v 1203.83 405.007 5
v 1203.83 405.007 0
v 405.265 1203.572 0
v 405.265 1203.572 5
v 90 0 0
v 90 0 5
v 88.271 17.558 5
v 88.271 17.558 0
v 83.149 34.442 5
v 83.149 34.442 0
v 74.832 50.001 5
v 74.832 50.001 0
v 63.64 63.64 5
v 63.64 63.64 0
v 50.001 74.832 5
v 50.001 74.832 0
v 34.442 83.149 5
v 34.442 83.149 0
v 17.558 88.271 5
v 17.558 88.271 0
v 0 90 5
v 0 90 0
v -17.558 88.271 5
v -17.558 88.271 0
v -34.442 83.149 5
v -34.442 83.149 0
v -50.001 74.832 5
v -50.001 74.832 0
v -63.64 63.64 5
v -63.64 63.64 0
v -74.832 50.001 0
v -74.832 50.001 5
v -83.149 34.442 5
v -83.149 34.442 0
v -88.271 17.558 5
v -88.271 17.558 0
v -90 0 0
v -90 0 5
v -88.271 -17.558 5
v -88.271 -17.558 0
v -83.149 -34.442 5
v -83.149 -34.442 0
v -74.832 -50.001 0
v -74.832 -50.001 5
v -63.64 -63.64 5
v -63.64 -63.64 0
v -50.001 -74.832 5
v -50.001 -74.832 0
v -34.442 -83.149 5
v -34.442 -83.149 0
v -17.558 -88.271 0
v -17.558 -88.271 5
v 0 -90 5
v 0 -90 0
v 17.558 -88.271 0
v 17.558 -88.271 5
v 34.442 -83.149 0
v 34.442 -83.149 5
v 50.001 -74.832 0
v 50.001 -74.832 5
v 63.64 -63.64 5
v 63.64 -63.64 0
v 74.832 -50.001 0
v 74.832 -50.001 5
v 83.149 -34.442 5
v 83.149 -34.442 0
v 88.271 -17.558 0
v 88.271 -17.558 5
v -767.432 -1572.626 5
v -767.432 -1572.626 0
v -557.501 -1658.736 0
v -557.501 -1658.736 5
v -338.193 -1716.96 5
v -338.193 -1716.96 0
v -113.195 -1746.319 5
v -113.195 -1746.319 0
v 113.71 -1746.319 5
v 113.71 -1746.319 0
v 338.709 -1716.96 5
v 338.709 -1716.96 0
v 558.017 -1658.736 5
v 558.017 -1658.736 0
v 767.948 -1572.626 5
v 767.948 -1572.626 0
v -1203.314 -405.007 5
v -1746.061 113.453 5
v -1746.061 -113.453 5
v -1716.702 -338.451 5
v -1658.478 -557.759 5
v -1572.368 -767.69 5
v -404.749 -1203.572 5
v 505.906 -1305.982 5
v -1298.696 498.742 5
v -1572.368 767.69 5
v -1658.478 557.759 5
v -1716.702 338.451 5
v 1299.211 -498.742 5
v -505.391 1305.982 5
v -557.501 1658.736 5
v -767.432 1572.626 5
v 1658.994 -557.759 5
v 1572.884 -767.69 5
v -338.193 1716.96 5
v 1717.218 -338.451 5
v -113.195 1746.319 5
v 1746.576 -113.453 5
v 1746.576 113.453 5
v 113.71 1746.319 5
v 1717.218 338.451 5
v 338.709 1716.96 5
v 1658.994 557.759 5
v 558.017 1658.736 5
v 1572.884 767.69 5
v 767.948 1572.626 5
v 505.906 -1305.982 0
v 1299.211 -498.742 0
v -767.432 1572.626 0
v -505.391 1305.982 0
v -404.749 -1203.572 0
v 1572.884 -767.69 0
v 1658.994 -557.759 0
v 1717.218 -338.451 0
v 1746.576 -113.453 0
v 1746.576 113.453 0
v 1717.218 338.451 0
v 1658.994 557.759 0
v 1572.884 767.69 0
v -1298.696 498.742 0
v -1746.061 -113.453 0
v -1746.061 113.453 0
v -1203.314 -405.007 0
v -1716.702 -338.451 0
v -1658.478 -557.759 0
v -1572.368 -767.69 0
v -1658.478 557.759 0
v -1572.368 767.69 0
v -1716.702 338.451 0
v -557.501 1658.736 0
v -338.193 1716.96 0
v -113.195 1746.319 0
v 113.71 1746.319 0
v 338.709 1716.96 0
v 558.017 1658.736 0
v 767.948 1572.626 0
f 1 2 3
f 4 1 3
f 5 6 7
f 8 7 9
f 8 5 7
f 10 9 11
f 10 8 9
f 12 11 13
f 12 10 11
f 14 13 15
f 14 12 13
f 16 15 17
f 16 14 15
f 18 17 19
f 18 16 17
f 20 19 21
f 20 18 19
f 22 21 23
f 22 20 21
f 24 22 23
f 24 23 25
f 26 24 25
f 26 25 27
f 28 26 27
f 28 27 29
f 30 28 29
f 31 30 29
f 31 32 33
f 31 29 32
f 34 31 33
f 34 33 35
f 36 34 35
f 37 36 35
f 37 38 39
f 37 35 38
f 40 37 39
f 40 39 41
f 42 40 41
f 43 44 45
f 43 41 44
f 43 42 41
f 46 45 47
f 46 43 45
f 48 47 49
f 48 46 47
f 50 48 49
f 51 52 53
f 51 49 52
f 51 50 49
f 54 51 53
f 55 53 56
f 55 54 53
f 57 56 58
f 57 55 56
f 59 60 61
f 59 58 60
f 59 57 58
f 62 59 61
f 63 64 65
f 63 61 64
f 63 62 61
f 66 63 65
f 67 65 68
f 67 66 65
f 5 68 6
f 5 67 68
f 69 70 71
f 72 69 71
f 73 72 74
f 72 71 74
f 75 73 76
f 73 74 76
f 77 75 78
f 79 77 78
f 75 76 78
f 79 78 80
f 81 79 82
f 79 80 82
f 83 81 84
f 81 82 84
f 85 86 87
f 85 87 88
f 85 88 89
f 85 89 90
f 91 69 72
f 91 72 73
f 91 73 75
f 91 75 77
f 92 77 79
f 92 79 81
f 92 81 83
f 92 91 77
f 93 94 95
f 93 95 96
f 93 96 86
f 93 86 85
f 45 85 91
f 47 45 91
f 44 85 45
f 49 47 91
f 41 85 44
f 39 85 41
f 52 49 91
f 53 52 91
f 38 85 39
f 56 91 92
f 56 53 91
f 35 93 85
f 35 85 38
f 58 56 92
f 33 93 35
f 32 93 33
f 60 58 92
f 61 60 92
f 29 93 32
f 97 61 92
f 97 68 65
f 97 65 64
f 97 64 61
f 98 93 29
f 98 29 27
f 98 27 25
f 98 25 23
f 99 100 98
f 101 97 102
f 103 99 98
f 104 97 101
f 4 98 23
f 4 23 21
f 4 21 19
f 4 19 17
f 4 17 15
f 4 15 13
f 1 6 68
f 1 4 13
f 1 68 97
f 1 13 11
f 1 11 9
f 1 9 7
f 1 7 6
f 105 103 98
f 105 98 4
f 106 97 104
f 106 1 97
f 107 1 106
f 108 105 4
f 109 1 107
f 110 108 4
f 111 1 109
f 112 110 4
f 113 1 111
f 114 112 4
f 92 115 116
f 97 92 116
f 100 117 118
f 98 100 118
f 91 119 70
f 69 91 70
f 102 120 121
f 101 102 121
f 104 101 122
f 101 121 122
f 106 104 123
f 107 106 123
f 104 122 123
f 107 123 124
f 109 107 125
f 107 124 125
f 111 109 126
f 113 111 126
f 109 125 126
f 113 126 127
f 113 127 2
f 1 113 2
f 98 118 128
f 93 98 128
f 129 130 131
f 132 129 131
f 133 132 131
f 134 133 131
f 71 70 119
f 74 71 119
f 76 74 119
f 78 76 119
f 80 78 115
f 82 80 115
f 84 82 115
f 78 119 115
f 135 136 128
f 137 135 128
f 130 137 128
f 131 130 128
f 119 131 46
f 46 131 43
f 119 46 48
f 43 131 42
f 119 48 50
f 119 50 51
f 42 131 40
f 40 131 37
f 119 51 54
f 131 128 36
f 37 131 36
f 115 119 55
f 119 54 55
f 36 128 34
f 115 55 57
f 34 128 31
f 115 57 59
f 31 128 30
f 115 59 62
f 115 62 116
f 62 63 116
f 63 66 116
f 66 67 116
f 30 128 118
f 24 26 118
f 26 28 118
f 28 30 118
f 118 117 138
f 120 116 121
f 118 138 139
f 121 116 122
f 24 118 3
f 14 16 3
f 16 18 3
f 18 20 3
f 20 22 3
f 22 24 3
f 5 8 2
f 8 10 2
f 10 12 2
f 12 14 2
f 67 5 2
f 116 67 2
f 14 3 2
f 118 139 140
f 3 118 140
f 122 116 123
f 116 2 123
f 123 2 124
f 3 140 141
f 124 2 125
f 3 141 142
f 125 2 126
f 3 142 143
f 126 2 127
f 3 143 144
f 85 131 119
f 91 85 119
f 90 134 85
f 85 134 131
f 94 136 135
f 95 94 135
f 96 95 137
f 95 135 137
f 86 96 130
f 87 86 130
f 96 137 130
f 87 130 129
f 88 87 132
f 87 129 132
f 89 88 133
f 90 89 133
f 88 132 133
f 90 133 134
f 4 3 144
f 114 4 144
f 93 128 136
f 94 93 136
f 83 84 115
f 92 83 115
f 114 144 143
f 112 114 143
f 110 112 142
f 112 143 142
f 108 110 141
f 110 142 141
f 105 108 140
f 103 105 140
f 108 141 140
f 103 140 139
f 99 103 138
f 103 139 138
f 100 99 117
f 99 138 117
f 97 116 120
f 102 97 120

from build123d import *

# Parameters (mm, degrees)
BOSS_EXTRUDE1_DEPTH = 5
SKETCH3_R           = 90
CUT_EXTRUDE3_DEPTH  = 10


with BuildPart() as part:
    # Sketch2 → Boss-Extrude1 (new body)
    with BuildSketch(Plane.XY):
        with BuildLine():
            Line((767.947915583, -1572.625771149), (505.906479137, -1305.981517926))
            Line((505.906479137, -1305.981517926), (1299.211324809, -498.742094189))
            Line((1299.211324809, -498.742094189), (1572.883525326, -767.690161406))
            ThreePointArc((1572.883525326, -767.690161406), (1750.257754177, 0), (1572.883525326, 767.690161406))
            Line((1572.883525326, 767.690161406), (1203.829573729, 405.006824211))
            Line((1203.829573729, 405.006824211), (405.264578388, 1203.571819552))
            Line((405.264578388, 1203.571819552), (767.947915583, 1572.625771149))
            ThreePointArc((767.947915583, 1572.625771149), (0.257754177, 1750), (-767.432407229, 1572.625771149))
            Line((-767.432407229, 1572.625771149), (-505.390970783, 1305.981517926))
            Line((-505.390970783, 1305.981517926), (-1298.695816455, 498.742094189))
            Line((-1298.695816455, 498.742094189), (-1572.368016972, 767.690161406))
            ThreePointArc((-1572.368016972, 767.690161406), (-1749.742245823, 0), (-1572.368016972, -767.690161406))
            Line((-1572.368016972, -767.690161406), (-1203.314065375, -405.006824211))
            Line((-1203.314065375, -405.006824211), (-404.749070034, -1203.571819552))
            Line((-404.749070034, -1203.571819552), (-767.432407229, -1572.625771149))
            ThreePointArc((-767.432407229, -1572.625771149), (0.257754177, -1750), (767.947915583, -1572.625771149))
        make_face()
    extrude(amount=BOSS_EXTRUDE1_DEPTH)

    # Sketch3 → Cut-Extrude3 (cut)
    with BuildSketch(Plane.XY):
        Circle(SKETCH3_R)
    extrude(amount=CUT_EXTRUDE3_DEPTH, mode=Mode.SUBTRACT)


solid = part.part
